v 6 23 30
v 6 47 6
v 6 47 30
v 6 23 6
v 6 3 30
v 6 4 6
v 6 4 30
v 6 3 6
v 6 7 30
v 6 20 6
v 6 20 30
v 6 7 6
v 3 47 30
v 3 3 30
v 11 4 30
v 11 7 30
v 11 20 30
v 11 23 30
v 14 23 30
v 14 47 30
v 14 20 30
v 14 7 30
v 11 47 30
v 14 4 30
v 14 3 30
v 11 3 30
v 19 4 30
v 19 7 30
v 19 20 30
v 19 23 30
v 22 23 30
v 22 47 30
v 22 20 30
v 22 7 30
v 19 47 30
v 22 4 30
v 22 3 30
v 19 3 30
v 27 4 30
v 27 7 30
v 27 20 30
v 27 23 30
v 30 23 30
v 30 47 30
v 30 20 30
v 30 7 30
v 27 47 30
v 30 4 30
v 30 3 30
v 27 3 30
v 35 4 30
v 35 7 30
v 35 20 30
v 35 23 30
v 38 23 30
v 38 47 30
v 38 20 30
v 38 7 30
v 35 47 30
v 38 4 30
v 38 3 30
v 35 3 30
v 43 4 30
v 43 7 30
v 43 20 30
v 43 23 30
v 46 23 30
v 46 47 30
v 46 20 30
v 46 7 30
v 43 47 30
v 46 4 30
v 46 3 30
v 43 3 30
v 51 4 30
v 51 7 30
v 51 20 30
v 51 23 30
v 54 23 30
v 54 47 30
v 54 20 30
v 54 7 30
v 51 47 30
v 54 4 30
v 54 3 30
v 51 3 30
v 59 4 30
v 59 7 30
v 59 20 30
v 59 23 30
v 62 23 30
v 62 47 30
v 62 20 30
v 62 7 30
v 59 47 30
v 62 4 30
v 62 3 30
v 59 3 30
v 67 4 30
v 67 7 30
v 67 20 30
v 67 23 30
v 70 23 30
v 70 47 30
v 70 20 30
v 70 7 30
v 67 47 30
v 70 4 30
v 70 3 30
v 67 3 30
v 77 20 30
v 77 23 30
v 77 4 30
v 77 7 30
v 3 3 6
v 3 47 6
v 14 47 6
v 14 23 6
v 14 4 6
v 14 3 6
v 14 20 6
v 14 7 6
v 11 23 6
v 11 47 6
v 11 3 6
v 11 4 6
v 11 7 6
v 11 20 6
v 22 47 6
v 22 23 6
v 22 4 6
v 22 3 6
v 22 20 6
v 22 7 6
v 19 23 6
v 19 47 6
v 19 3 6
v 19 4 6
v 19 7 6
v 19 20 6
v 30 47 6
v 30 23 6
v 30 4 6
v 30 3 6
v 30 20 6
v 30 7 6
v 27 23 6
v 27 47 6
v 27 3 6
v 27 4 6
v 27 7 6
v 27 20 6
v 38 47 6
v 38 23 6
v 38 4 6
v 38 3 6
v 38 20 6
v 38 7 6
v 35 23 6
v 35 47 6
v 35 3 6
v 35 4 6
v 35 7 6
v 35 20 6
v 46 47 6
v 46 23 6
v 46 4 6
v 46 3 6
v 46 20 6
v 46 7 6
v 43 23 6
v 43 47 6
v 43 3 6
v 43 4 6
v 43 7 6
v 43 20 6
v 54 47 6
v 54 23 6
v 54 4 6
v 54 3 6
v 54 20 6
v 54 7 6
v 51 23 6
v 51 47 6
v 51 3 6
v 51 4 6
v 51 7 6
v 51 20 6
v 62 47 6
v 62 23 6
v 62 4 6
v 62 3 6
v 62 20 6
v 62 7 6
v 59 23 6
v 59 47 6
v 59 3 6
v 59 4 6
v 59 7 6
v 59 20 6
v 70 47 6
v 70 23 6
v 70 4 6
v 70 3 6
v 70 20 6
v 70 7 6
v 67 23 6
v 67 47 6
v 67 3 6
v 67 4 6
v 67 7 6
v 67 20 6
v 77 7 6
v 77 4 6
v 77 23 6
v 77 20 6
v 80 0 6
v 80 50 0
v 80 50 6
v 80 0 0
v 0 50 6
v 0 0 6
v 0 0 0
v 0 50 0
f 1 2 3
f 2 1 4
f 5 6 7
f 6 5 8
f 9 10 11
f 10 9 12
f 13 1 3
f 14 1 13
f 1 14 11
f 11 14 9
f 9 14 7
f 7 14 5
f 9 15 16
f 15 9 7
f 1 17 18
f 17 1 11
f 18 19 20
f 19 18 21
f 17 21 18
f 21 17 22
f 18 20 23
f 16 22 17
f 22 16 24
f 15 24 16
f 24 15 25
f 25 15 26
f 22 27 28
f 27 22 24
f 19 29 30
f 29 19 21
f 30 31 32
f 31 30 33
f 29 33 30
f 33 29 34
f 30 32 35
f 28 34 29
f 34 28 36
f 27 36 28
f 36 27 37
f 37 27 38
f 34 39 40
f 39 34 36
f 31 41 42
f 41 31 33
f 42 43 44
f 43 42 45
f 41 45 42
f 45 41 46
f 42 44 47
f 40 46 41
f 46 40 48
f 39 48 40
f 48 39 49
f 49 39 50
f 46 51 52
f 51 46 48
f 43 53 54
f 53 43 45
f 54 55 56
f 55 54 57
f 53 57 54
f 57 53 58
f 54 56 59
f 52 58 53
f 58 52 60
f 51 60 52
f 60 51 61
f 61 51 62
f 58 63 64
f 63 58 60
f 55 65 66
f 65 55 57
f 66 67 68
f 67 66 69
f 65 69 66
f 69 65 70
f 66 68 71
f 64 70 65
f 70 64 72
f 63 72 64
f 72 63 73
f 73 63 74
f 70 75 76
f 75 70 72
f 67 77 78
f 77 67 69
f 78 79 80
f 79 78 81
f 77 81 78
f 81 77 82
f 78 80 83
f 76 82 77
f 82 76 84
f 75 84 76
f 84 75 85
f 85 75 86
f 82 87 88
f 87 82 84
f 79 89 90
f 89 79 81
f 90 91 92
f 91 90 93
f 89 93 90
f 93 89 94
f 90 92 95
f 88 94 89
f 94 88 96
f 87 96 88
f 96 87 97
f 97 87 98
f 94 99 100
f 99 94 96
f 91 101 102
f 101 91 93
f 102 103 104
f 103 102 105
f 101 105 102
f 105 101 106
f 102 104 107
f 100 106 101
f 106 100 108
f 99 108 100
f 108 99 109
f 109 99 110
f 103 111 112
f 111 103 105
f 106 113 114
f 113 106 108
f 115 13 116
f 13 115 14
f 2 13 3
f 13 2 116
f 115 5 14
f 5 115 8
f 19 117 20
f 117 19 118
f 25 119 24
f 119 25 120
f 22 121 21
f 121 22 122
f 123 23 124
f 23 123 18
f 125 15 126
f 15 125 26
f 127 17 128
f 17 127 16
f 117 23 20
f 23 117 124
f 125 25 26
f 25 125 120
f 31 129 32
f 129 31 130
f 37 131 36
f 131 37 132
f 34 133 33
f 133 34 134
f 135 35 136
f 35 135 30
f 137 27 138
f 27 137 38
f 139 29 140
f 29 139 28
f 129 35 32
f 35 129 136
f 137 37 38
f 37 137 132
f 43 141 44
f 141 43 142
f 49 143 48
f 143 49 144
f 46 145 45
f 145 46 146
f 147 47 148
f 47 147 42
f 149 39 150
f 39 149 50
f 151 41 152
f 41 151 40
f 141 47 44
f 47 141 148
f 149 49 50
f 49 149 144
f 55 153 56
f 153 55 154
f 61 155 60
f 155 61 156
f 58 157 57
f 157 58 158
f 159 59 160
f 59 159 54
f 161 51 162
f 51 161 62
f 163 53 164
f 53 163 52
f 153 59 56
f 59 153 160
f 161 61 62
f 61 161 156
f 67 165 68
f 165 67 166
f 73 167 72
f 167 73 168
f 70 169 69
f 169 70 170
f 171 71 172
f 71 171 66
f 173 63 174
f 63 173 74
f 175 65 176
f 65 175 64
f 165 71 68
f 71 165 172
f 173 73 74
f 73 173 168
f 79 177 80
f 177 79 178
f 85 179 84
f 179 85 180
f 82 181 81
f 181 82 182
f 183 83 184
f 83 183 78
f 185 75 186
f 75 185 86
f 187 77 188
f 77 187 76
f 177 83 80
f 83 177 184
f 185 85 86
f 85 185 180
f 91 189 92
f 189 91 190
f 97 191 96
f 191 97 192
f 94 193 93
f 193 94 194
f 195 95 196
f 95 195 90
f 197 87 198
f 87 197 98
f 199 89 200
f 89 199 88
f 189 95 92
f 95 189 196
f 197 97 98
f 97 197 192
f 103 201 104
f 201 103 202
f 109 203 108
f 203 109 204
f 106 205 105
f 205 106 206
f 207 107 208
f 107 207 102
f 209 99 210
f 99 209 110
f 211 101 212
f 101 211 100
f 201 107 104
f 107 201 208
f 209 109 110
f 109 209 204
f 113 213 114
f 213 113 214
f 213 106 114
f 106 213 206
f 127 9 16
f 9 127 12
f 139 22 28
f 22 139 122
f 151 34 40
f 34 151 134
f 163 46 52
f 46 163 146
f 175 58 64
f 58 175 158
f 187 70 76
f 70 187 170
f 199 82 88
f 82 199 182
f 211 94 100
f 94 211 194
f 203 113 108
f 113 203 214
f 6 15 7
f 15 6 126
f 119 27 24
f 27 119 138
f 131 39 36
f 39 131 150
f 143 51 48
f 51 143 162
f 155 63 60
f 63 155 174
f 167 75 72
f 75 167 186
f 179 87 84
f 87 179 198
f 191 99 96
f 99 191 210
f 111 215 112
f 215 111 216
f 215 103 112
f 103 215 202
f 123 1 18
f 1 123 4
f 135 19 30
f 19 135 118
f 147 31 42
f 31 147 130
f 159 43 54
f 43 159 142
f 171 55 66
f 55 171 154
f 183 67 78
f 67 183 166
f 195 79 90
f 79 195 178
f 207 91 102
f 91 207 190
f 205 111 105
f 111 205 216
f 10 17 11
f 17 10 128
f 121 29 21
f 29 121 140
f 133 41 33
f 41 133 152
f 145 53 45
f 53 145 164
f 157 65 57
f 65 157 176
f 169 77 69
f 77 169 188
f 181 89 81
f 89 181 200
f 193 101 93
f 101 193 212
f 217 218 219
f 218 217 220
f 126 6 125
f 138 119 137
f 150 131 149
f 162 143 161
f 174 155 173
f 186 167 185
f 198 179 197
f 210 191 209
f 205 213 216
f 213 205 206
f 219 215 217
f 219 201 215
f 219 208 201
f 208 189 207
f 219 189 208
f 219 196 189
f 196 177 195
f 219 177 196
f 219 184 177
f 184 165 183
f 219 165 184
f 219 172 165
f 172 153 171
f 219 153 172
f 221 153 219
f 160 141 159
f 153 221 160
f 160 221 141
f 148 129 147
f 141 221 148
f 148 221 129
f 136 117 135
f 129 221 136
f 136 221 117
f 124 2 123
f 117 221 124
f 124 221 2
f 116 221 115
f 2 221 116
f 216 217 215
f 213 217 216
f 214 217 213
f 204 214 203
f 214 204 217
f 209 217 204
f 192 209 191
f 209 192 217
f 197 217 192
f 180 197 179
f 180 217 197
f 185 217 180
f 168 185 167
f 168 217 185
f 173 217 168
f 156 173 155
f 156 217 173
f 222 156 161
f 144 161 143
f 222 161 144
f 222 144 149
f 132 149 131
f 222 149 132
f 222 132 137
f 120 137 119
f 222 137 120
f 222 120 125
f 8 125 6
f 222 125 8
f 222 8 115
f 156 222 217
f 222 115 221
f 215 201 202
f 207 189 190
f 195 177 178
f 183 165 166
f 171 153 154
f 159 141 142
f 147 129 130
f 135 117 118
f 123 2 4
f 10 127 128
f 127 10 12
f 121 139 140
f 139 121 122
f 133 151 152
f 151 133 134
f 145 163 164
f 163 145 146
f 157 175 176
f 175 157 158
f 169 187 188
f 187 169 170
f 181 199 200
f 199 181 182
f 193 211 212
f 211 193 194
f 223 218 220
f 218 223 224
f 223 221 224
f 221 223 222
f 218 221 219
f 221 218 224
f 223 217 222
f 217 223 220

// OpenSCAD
$fn = 32;

// ----------------------------------------------------------------------
// Heatsink: cross fin block
// ----------------------------------------------------------------------

// --- parameters (mm) ---
base_l = 80;              // base length, X
base_w = 50;              // base width, Y
base_t = 6;               // base plate thickness
fin_h = 25;               // fin height above the base
fin_t = 3;                // fin thickness
edge = 3;                 // margin from the base ends
pitch = 8;                // fin pitch
rib_pitch = 16;           // cross rib pitch

n_fins = floor((base_l - 2 * edge - fin_t) / pitch) + 1;  // fin count
total_h = base_t + fin_h - 1;  // overall height
n_ribs = floor((base_w - 2 * edge) / rib_pitch);  // rib count

union() {
  cube([base_l, base_w, base_t]);
  for (i = [0 : n_fins - 1])
    translate([edge + i * pitch, edge, base_t - 1])
      cube([fin_t, base_w - 2 * edge, fin_h]);
  for (i = [0 : n_ribs - 1])
    translate([edge, edge + 1 + i * rib_pitch, base_t - 1])
      cube([base_l - 2 * edge, fin_t, fin_h]);
}
